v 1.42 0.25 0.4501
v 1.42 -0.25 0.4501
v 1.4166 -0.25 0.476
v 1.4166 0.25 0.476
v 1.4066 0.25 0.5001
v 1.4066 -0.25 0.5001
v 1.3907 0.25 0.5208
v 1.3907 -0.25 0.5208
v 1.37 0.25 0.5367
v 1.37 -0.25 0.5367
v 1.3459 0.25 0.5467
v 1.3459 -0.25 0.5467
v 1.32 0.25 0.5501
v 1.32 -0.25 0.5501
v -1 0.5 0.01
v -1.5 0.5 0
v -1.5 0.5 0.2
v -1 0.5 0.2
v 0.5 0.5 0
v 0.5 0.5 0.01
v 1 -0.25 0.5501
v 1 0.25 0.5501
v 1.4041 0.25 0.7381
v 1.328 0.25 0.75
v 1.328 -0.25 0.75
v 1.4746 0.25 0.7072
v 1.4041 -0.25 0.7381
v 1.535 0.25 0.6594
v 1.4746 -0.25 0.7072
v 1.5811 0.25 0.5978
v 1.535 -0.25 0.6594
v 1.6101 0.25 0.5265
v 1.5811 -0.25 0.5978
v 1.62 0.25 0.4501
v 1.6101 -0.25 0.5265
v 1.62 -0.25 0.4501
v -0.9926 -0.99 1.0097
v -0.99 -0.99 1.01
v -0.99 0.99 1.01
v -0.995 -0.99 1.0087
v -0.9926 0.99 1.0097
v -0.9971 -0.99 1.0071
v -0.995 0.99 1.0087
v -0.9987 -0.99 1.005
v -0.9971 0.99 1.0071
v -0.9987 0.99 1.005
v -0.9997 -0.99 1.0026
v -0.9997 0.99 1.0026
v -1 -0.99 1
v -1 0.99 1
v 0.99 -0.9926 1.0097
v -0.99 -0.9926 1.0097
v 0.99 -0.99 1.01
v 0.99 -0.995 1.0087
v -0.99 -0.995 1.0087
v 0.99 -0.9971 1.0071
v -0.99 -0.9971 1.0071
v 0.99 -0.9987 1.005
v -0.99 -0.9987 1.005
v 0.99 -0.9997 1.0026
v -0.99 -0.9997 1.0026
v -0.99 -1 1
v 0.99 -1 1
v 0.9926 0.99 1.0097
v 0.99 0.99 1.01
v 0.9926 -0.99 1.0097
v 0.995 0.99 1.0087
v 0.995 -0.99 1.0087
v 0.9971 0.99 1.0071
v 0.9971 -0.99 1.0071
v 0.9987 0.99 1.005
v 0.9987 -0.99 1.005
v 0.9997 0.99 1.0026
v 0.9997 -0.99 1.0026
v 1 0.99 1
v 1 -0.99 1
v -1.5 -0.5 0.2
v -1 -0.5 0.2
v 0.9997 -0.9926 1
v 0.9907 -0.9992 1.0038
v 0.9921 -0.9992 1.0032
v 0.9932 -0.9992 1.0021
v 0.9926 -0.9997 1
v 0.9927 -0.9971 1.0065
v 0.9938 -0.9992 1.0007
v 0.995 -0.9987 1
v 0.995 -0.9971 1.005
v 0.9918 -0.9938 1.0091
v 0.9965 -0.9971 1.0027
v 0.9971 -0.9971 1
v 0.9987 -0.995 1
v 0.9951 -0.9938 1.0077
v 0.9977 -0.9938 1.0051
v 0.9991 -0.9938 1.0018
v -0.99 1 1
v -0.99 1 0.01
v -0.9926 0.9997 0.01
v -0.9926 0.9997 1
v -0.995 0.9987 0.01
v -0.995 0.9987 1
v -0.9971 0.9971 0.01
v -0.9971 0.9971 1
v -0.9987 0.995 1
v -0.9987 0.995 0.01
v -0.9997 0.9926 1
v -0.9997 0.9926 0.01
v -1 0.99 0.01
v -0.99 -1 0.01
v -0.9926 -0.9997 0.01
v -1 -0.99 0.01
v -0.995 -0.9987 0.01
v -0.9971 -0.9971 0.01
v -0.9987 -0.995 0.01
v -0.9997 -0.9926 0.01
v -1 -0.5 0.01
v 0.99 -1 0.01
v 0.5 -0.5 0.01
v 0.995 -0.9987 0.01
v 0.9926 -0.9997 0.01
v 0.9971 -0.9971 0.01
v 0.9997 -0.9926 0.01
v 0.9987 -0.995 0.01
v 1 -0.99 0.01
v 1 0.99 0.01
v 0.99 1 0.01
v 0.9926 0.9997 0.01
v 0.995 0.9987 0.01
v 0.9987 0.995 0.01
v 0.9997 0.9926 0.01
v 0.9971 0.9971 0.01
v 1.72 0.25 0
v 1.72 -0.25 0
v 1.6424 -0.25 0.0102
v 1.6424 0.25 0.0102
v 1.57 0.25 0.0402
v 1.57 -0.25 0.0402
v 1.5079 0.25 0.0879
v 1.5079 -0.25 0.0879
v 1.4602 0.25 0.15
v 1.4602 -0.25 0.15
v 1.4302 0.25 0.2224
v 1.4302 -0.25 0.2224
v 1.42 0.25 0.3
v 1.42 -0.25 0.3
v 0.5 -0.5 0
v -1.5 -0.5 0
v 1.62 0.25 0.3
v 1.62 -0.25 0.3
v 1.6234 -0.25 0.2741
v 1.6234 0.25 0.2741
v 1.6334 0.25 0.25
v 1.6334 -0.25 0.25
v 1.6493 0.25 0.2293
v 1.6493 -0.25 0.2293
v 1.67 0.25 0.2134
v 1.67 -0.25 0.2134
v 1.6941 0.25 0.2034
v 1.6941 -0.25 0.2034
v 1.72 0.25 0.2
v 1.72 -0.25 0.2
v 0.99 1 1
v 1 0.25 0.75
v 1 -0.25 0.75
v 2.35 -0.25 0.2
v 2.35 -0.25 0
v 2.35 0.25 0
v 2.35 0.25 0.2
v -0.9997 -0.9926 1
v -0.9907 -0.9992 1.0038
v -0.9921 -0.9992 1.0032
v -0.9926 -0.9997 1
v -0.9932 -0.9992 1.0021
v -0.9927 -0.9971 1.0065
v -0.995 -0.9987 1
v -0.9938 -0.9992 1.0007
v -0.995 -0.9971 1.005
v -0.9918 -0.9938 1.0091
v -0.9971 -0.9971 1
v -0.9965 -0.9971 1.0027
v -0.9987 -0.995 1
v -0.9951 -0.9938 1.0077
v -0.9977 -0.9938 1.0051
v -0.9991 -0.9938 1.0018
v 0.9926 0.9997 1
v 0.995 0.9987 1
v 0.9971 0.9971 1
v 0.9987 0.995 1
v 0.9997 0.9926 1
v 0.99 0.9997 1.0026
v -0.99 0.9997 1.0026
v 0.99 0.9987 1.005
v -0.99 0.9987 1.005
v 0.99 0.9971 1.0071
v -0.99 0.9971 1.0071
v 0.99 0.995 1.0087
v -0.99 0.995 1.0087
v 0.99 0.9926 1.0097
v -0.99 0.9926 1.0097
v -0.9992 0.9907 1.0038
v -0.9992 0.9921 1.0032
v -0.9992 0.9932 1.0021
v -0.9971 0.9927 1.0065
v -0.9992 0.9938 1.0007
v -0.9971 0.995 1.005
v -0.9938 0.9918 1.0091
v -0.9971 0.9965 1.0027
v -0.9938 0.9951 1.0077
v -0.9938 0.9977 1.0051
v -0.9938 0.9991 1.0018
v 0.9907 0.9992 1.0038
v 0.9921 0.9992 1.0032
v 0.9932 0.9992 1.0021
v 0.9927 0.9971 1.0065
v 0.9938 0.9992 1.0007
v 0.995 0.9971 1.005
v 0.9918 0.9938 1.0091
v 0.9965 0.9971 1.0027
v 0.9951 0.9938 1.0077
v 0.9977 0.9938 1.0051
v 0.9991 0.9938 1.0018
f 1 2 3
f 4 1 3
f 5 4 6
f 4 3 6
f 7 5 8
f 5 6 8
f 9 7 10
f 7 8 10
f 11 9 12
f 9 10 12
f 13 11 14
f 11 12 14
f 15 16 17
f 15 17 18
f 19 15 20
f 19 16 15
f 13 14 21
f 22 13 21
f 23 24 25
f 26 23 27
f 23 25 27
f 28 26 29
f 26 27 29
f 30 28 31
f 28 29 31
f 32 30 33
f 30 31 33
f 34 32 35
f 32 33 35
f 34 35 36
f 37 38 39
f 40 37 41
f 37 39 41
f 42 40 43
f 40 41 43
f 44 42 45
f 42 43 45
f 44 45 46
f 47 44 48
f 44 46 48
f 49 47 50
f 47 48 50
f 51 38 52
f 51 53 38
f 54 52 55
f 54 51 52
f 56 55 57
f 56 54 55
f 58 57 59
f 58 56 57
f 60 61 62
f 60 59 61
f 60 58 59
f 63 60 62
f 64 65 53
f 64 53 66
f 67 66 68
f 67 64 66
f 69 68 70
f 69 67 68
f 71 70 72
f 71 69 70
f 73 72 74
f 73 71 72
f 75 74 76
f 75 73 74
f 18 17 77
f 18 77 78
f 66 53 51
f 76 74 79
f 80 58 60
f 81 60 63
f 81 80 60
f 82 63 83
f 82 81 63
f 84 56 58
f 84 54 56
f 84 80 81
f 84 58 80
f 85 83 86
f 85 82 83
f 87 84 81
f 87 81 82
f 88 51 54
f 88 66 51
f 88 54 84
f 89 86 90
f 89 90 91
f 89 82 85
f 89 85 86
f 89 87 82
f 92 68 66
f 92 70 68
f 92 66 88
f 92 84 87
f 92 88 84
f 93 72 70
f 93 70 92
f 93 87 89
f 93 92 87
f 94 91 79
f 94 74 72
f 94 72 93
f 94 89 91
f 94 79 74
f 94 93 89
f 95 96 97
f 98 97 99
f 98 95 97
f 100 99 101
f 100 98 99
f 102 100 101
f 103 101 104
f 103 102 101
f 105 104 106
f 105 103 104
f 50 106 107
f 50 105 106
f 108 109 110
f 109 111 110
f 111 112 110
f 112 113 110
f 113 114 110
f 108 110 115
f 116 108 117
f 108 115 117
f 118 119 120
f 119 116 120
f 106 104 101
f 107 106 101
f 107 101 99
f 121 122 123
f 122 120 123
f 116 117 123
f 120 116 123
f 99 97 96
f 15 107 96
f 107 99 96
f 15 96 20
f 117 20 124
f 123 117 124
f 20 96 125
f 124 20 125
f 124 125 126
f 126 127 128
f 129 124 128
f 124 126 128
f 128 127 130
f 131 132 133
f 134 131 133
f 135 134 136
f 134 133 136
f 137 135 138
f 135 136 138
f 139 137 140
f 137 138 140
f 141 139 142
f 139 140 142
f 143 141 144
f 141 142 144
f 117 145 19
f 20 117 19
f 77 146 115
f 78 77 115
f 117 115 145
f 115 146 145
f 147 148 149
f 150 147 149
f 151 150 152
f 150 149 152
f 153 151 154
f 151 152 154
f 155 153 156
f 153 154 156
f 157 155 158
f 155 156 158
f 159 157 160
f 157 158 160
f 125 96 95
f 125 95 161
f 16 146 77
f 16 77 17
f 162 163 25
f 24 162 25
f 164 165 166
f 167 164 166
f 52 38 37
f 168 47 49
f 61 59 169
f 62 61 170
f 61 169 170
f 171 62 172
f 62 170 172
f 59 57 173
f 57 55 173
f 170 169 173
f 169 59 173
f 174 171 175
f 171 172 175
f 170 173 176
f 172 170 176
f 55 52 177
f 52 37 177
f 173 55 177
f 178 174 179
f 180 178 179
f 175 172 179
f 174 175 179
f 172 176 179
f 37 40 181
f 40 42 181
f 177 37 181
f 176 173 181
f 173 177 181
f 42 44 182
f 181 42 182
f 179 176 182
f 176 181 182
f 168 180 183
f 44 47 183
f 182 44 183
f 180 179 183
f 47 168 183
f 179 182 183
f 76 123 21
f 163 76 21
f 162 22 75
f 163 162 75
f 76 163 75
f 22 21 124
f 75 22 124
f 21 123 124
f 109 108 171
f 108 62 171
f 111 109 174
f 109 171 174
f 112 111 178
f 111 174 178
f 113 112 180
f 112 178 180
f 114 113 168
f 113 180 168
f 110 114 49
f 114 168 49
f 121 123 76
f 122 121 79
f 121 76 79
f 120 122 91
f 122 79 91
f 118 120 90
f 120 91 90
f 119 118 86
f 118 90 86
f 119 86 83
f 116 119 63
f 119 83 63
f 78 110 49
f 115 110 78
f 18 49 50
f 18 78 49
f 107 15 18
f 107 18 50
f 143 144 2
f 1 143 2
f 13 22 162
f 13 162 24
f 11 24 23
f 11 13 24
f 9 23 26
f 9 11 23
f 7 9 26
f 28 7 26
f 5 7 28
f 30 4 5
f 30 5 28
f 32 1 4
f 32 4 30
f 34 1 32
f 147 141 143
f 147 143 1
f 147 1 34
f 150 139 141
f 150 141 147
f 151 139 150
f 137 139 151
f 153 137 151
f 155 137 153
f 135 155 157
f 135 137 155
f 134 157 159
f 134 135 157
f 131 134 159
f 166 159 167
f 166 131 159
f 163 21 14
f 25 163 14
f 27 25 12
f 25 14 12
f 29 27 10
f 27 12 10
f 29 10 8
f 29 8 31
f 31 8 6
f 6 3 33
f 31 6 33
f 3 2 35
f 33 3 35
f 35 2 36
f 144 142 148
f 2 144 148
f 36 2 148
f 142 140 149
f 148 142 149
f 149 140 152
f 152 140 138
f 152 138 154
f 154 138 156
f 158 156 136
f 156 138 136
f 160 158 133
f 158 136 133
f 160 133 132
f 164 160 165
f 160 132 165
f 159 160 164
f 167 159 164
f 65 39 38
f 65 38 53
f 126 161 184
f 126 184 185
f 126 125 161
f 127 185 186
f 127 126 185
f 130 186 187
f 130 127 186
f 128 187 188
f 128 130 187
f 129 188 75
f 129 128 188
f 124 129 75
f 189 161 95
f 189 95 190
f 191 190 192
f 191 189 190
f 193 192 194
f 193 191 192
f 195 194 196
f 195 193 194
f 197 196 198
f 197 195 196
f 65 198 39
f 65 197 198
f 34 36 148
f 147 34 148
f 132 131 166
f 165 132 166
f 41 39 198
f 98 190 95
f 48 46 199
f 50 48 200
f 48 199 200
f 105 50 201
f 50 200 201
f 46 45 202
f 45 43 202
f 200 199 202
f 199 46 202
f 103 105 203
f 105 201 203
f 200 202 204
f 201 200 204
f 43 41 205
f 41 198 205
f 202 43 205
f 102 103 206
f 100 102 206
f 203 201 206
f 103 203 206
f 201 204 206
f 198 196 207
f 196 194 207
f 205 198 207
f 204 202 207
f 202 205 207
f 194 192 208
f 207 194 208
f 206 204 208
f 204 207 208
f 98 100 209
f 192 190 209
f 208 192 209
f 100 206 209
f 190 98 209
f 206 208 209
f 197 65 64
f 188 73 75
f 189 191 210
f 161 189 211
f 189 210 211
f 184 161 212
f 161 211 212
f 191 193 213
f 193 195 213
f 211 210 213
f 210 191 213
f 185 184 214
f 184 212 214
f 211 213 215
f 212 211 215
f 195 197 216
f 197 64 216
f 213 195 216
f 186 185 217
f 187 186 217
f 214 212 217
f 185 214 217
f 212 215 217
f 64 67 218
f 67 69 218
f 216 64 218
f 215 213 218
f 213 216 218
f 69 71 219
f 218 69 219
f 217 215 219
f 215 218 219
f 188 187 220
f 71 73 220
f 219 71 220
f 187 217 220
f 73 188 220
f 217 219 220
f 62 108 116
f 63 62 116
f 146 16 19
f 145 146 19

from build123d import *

# Parameters (mm, degrees)
SKETCH1_W      = 2
SKETCH1_H      = 2
EXTRUDE1_DEPTH = 1
SKETCH2_W      = 2
SKETCH2_H      = 1
EXTRUDE2_DEPTH = 0.2
SKETCH3_W      = 1.35
SKETCH3_H      = 0.5
EXTRUDE3_DEPTH = 0.75
EXTRUDE4_DEPTH = 2.25
FILLET1_R      = 0.01


with BuildPart() as part:
    # Sketch1 → Extrude1 (new body)
    with BuildSketch(Plane.XY.offset(0.01)):
        Rectangle(SKETCH1_W, SKETCH1_H)
    extrude(amount=EXTRUDE1_DEPTH)

    # Sketch2 → Extrude2 (add)
    with BuildSketch(Plane.XY):
        with Locations((-0.5, 0)):
            Rectangle(SKETCH2_W, SKETCH2_H)
    extrude(amount=EXTRUDE2_DEPTH)

    # Sketch3 → Extrude3 (add)
    with BuildSketch(Plane.XY):
        with Locations((1.675, 0)):
            Rectangle(SKETCH3_W, SKETCH3_H)
    extrude(amount=EXTRUDE3_DEPTH)

    # Sketch4 → Extrude4 (cut, through all)
    with BuildSketch(Plane.XZ.offset(0.25)):
        with BuildLine():
            Line((2.35, 0.2), (2.35, 0.75))
            Line((2.35, 0.75), (1.32, 0.750107803))
            ThreePointArc((1.32, 0.750107803), (1.532132034, 0.662239837), (1.62, 0.450107803))
            Line((1.62, 0.450107803), (1.62, 0.3))
            ThreePointArc((1.62, 0.3), (1.649289322, 0.229289322), (1.72, 0.2))
            Line((1.72, 0.2), (2.35, 0.2))
        make_face()
        with BuildLine():
            Line((1.32, 0.550107803), (1, 0.550107803))
            Line((1, 0.550107803), (1, 0))
            Line((1, 0), (1.72, 0))
            ThreePointArc((1.72, 0), (1.507867966, 0.087867966), (1.42, 0.3))
            Line((1.42, 0.3), (1.42, 0.450107803))
            ThreePointArc((1.42, 0.450107803), (1.390710678, 0.520818481), (1.32, 0.550107803))
        make_face()
    extrude(amount=-EXTRUDE4_DEPTH, mode=Mode.SUBTRACT)

    # Fillet1
    fillet1_edges = [part.edges().sort_by_distance(p)[0] for p in [
        (1, 0, 1.01),
        (0, 1, 1.01),
        (-1, 0, 1.01),
        (0, -1, 1.01),
        (-1, 1, 0.51),
        (1, 1, 0.51),
        (1, -1, 0.51),
        (-1, -1, 0.51),
    ]]
    fillet(fillet1_edges, radius=FILLET1_R)


solid = part.part
